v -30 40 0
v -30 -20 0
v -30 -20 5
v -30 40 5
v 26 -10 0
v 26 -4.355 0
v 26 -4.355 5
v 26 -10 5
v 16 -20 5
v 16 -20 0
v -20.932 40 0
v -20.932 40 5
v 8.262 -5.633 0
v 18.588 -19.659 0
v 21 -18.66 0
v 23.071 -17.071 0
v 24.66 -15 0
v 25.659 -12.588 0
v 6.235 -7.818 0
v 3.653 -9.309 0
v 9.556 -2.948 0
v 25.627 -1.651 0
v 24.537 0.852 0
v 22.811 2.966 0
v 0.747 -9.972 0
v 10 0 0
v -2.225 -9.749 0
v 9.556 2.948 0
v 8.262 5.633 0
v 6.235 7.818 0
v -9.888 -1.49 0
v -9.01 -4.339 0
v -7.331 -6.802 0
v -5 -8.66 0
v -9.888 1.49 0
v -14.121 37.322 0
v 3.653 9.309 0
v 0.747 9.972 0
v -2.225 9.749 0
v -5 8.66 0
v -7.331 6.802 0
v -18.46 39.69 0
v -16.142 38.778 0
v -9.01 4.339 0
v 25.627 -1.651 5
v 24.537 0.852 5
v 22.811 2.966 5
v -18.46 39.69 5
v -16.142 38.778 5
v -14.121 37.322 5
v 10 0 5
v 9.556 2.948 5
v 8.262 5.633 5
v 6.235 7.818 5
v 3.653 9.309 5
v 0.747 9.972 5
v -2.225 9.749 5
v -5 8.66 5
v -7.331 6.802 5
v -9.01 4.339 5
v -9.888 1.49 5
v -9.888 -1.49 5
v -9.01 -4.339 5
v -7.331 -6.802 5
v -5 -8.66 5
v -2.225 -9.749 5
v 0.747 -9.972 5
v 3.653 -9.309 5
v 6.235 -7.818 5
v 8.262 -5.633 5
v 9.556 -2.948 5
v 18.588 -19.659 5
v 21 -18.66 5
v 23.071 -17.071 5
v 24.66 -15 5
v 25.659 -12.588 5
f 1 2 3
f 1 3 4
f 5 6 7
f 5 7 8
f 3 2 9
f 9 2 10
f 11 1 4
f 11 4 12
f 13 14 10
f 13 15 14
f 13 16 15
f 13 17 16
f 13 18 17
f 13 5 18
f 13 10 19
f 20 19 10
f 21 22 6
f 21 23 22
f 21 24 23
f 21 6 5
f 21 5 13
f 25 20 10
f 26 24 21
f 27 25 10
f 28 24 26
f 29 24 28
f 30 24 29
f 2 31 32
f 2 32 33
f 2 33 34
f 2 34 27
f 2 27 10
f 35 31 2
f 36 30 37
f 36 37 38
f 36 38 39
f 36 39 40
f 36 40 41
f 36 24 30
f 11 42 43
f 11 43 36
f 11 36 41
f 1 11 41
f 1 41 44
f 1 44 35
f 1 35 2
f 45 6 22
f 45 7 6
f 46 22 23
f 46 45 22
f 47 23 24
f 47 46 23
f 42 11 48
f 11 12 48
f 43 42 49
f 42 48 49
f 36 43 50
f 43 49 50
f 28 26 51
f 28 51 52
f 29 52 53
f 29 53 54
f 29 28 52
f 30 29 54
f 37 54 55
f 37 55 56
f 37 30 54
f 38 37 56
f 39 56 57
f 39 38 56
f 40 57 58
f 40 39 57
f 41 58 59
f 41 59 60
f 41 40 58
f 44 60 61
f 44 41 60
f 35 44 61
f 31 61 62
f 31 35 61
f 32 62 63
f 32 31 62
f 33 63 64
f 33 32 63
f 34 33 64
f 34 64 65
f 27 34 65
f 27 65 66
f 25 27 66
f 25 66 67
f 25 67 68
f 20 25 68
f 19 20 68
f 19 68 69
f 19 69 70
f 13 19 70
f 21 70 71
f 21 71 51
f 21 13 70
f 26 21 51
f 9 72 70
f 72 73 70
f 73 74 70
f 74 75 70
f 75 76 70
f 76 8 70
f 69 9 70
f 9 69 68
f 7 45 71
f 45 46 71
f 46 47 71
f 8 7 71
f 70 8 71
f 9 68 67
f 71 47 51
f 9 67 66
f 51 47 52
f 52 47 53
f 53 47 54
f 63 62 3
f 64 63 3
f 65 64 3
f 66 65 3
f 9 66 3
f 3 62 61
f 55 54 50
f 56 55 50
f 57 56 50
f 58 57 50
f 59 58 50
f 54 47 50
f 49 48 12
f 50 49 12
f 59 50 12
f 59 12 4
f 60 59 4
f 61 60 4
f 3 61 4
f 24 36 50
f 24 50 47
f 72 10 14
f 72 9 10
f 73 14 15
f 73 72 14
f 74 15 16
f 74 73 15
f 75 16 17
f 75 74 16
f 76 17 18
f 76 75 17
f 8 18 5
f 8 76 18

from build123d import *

# Parameters (mm, degrees)
SKETCH1_R           = 10
BOSS_EXTRUDE1_DEPTH = 5
FILLET1_R           = 10


with BuildPart() as part:
    # Sketch1 → Boss-Extrude1 (new body)
    with BuildSketch(Plane.XY):
        Polygon((0, -20), (-30, -20), (-30, 40), (-17, 40), (26, 0), (26, -20), align=None)
        Circle(SKETCH1_R, mode=Mode.SUBTRACT)
    extrude(amount=BOSS_EXTRUDE1_DEPTH)

    # Fillet1
    fillet1_edges = [part.edges().sort_by_distance(p)[0] for p in [
        (-17, 40, 2.5),
        (26, 0, 2.5),
        (26, -20, 2.5),
    ]]
    fillet(fillet1_edges, radius=FILLET1_R)


solid = part.part
